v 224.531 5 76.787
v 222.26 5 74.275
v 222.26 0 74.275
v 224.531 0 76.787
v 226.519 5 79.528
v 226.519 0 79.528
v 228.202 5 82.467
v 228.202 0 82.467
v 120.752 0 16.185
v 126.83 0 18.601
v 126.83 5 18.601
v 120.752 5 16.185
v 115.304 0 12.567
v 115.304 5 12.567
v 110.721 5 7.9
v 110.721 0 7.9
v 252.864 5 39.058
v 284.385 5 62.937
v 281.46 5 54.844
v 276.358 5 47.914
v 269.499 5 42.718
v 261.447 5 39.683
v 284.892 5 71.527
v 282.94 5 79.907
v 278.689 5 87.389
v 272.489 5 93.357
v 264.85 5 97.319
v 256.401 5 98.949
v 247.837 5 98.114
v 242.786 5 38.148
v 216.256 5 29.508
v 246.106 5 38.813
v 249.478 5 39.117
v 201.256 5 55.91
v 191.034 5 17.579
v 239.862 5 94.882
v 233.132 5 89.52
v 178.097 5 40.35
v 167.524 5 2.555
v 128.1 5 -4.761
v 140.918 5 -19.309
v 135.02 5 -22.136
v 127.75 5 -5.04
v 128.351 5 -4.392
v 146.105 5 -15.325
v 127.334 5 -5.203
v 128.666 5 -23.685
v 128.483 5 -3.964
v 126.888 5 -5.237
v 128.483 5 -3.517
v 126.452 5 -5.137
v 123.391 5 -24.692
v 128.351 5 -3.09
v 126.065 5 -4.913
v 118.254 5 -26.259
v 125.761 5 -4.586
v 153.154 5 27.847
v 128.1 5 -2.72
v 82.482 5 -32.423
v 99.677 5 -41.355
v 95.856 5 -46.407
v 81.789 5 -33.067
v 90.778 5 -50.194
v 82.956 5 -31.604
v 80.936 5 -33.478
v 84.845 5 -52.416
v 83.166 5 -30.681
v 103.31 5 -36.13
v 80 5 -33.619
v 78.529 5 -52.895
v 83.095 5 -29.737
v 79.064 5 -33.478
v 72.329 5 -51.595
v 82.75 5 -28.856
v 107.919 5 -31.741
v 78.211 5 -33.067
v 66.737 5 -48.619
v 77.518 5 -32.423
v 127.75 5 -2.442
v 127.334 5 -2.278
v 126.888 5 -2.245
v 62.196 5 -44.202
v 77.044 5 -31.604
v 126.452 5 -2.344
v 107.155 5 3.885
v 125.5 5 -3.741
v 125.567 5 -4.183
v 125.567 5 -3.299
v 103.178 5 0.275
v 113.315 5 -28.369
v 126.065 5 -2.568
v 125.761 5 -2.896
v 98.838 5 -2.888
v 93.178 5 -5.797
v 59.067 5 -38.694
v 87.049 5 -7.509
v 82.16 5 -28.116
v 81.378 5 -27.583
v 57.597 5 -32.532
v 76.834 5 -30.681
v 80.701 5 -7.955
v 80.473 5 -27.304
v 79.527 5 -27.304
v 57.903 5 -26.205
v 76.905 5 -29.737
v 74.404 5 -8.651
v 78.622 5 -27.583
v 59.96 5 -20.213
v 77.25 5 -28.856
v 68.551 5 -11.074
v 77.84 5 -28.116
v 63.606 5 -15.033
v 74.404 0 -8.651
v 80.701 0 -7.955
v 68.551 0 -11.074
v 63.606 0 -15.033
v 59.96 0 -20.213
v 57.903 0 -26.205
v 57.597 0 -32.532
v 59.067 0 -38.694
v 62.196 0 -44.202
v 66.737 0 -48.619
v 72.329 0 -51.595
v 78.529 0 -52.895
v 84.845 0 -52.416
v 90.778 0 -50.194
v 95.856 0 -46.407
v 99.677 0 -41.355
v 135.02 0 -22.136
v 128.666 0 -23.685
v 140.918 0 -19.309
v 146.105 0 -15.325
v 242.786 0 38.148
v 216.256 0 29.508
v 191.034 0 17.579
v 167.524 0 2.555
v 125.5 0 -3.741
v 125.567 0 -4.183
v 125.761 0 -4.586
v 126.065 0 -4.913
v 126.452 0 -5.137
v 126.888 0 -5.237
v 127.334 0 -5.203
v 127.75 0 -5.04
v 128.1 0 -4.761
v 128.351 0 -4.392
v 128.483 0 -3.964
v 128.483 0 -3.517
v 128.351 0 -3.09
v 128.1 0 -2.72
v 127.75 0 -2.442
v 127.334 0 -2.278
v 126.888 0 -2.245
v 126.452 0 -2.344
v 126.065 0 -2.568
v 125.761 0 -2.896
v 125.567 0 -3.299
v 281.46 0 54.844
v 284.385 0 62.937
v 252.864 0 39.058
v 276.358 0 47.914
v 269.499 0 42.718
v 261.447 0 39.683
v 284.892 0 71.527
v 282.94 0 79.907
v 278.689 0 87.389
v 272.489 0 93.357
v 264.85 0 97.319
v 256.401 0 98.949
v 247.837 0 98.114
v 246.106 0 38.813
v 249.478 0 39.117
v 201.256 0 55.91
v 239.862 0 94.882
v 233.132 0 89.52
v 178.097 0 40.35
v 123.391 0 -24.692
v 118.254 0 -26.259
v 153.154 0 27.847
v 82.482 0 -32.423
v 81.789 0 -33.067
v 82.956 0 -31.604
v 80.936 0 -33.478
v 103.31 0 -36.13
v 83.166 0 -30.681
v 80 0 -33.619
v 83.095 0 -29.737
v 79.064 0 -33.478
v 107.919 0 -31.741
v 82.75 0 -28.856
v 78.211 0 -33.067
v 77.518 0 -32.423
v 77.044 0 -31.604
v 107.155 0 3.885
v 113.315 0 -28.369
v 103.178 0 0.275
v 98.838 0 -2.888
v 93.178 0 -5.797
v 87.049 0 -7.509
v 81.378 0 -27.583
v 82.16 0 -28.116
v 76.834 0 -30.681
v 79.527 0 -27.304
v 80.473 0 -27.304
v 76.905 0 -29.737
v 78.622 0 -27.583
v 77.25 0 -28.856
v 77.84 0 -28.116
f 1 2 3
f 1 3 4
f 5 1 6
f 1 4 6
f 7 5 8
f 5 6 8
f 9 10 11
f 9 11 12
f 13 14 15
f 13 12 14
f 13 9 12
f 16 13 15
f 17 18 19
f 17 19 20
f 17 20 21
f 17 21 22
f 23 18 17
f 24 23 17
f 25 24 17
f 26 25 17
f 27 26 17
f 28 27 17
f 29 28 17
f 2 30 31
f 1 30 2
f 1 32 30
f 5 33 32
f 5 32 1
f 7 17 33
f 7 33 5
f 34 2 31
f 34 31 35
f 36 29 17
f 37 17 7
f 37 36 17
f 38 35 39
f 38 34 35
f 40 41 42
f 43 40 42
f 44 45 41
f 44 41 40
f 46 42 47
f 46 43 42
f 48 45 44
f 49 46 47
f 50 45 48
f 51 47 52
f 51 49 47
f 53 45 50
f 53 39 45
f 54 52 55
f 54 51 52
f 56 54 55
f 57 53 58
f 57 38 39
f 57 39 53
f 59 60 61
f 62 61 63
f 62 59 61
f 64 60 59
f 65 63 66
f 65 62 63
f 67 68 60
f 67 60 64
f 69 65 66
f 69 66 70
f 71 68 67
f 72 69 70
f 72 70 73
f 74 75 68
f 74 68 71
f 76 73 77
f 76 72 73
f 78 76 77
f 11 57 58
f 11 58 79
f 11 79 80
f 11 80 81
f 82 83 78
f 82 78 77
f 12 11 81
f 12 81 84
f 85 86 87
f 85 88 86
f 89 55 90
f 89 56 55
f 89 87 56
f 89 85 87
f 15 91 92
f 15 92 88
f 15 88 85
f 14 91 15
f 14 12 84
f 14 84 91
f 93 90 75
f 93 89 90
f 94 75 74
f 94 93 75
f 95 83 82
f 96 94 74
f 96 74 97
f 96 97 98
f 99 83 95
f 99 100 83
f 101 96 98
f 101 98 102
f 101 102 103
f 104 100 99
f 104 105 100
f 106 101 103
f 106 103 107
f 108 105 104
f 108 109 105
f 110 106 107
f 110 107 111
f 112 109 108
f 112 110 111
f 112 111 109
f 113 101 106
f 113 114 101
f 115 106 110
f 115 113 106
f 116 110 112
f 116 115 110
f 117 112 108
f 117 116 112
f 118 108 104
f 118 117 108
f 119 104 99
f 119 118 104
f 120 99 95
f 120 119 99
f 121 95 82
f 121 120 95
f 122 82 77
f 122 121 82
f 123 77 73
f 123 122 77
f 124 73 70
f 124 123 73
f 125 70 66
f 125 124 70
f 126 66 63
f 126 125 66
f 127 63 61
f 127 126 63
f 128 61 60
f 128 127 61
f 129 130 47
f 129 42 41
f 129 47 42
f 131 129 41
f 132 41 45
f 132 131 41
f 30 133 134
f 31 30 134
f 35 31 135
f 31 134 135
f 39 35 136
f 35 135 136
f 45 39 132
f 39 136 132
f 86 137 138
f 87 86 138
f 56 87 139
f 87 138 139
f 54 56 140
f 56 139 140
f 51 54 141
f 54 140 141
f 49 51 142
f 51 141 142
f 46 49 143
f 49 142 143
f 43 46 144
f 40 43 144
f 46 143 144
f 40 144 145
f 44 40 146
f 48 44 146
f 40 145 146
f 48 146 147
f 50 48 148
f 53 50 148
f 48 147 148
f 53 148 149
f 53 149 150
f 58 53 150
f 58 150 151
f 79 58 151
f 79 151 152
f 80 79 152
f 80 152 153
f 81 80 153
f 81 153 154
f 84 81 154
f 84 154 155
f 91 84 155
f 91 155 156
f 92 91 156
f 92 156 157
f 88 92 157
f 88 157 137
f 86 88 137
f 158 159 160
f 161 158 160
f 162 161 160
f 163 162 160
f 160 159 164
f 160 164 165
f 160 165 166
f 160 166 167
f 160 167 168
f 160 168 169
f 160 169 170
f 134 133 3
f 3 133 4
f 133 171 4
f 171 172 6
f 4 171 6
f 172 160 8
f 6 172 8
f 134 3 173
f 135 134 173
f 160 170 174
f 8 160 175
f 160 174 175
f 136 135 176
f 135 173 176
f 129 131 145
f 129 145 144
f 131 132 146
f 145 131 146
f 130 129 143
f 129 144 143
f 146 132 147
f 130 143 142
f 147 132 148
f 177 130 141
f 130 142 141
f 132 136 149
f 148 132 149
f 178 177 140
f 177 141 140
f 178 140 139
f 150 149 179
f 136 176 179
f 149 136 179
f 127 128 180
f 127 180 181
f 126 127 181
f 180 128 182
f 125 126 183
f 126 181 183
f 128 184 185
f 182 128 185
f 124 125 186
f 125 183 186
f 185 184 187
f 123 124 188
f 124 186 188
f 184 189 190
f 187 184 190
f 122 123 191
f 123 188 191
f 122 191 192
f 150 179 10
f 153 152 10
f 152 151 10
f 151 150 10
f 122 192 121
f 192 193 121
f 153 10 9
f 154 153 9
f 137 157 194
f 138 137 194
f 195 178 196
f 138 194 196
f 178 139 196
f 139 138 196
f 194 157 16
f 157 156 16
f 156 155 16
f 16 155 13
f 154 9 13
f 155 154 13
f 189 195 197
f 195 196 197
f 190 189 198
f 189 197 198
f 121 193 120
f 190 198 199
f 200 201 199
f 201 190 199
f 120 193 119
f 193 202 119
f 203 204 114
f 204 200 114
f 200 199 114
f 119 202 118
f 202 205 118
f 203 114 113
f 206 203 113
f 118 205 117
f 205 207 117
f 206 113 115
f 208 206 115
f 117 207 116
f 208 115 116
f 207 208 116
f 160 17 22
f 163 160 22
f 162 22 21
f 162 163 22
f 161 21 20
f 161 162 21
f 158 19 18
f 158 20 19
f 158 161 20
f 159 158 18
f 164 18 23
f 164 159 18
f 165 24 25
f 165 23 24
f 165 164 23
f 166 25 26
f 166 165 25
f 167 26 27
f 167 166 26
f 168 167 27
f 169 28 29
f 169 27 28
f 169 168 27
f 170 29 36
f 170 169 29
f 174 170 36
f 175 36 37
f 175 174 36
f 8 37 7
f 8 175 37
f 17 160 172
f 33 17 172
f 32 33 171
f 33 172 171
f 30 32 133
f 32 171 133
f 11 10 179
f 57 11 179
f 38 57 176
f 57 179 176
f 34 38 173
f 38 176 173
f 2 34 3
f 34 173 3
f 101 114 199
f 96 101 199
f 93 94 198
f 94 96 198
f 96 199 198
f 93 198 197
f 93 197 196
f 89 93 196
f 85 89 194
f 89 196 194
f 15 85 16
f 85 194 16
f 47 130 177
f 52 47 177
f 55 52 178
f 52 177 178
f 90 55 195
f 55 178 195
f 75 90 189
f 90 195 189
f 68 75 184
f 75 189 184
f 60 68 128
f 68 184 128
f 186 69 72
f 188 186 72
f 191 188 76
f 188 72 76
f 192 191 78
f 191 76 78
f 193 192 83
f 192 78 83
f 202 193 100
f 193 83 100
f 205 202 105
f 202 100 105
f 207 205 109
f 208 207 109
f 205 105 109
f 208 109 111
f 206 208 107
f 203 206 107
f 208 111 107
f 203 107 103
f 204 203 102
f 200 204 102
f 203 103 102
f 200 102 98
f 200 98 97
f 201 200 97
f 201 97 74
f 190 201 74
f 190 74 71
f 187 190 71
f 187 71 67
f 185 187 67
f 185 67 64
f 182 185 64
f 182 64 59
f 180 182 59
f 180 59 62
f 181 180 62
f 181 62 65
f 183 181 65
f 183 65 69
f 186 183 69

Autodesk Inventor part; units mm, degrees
ref_plane "YZ Plane" through (0, 0, 0) normal (1, 0, 0) x (0, 1, 0)
ref_plane "XZ Plane" through (0, 0, 0) normal (0, 1, 0) x (-1, 0, 0)
ref_plane "XY Plane" through (0, 0, 0) normal (0, 0, 1) x (1, 0, 0)
sketch "Cara" plane through (0, 0, 0) normal (0, 0, 1) x (1, 0, 0)
  line L0 (-22.1935, -24.9393) -> (-15.1747, -17.9205)
  arc A0 (-12.474, -17.8034) -> (-15.1747, -17.9205) centre (-13.7605, -19.3347) ccw
  arc A1 (-12.474, -17.8034) -> (-6.107, -21.4794) centre (1.0981, -1.6477) ccw
  arc A2 (-4.8581, -23.8768) -> (-6.107, -21.4794) centre (-6.79, -23.3592) ccw
  line L1 (-4.8581, -23.8768) -> (-7.4272, -33.4646)
  arc A3 (-9.9928, -34.8439) -> (-7.4272, -33.4646) centre (-9.359, -32.947) ccw
  arc A4 (-22.1052, -27.8509) -> (-9.9928, -34.8439) centre (1.0981, -1.6477) ccw
  arc A5 (-22.1935, -24.9393) -> (-22.1052, -27.8509) centre (-20.7793, -26.3535) ccw
  line L2 (9.6235, -33.4646) -> (7.0544, -23.8768)
  arc A6 (8.3033, -21.4794) -> (7.0544, -23.8768) centre (8.9863, -23.3592) ccw
  arc A7 (8.3033, -21.4794) -> (14.6703, -17.8034) centre (1.0981, -1.6477) ccw
  arc A8 (17.371, -17.9205) -> (14.6703, -17.8034) centre (15.9568, -19.3347) ccw
  line L3 (17.371, -17.9205) -> (24.3898, -24.9393)
  arc A9 (24.3015, -27.8509) -> (24.3898, -24.9393) centre (22.9756, -26.3535) ccw
  arc A10 (12.1891, -34.8439) -> (24.3015, -27.8509) centre (1.0981, -1.6477) ccw
  arc A11 (9.6235, -33.4646) -> (12.1891, -34.8439) centre (11.5553, -32.947) ccw
  line L4 (32.9151, -10.173) -> (23.3272, -7.604)
  arc A12 (21.8755, -5.3237) -> (23.3272, -7.604) centre (23.8449, -5.6721) ccw
  arc A13 (21.8755, -5.3237) -> (21.8755, 2.0283) centre (1.0981, -1.6477) ccw
  arc A14 (23.3272, 4.3086) -> (21.8755, 2.0283) centre (23.8449, 2.3767) ccw
  line L5 (23.3272, 4.3086) -> (32.9151, 6.8776)
  arc A15 (35.3924, 5.3454) -> (32.9151, 6.8776) centre (33.4327, 4.9458) ccw
  arc A16 (35.3924, -8.6408) -> (35.3924, 5.3454) centre (1.0981, -1.6477) ccw
  arc A17 (32.9151, -10.173) -> (35.3924, -8.6408) centre (33.4327, -8.2412) ccw
  line L6 (24.3898, 21.6439) -> (17.371, 14.6251)
  arc A18 (14.6703, 14.508) -> (17.371, 14.6251) centre (15.9568, 16.0394) ccw
  arc A19 (14.6703, 14.508) -> (8.3033, 18.184) centre (1.0981, -1.6477) ccw
  arc A20 (7.0544, 20.5814) -> (8.3033, 18.184) centre (8.9863, 20.0638) ccw
  line L7 (7.0544, 20.5814) -> (9.6235, 30.1693)
  arc A21 (12.1891, 31.5486) -> (9.6235, 30.1693) centre (11.5553, 29.6516) ccw
  arc A22 (24.3015, 24.5555) -> (12.1891, 31.5486) centre (1.0981, -1.6477) ccw
  arc A23 (24.3898, 21.6439) -> (24.3015, 24.5555) centre (22.9756, 23.0582) ccw
  line L8 (-7.4272, 30.1693) -> (-4.8581, 20.5814)
  arc A24 (-6.107, 18.184) -> (-4.8581, 20.5814) centre (-6.79, 20.0638) ccw
  arc A25 (-6.107, 18.184) -> (-12.474, 14.508) centre (1.0981, -1.6477) ccw
  arc A26 (-15.1747, 14.6251) -> (-12.474, 14.508) centre (-13.7605, 16.0394) ccw
  line L9 (-15.1747, 14.6251) -> (-22.1935, 21.6439)
  arc A27 (-22.1052, 24.5555) -> (-22.1935, 21.6439) centre (-20.7793, 23.0582) ccw
  arc A28 (-9.9928, 31.5486) -> (-22.1052, 24.5555) centre (1.0981, -1.6477) ccw
  arc A29 (-7.4272, 30.1693) -> (-9.9928, 31.5486) centre (-9.359, 29.6516) ccw
  line L10 (-30.7188, 6.8776) -> (-21.131, 4.3086)
  arc A30 (-19.6792, 2.0283) -> (-21.131, 4.3086) centre (-21.6486, 2.3767) ccw
  arc A31 (-19.6792, 2.0283) -> (-19.6792, -5.3237) centre (1.0981, -1.6477) ccw
  arc A32 (-21.131, -7.604) -> (-19.6792, -5.3237) centre (-21.6486, -5.6721) ccw
  line L11 (-21.131, -7.604) -> (-30.7188, -10.173)
  arc A33 (-33.1961, -8.6408) -> (-30.7188, -10.173) centre (-31.2365, -8.2412) ccw
  arc A34 (-33.1961, 5.3454) -> (-33.1961, -8.6408) centre (1.0981, -1.6477) ccw
  arc A35 (-30.7188, 6.8776) -> (-33.1961, 5.3454) centre (-31.2365, 4.9458) ccw
  circle A36 centre (-37.4568, -19.3542) radius 1.5875
  circle A37 centre (39.653, 16.0588) radius 1.5875
  circle A38 centre (-16.6083, 36.9072) radius 1.5875
  circle A39 centre (18.8046, -40.2026) radius 1.5875
  circle A40 centre (1.0981, -1.6477) radius 15.5
  arc A41 (13.186, 39.6183) -> (16.9444, 39.4394) centre (15.4349, 47.2957) ccw
  arc A42 (13.186, 39.6183) -> (-10.9897, 39.6183) centre (1.0981, -1.6477) ccw
  arc A43 (-15.0916, 39.5133) -> (-10.9897, 39.6183) centre (-13.2386, 47.2957) ccw
  arc A44 (-15.0916, 39.5133) -> (-19.5734, 37.455) centre (-16.0181, 35.6221) ccw
  arc A45 (-22.3261, 34.412) -> (-19.5734, 37.455) centre (-26.6841, 41.1208) ccw
  arc A46 (-22.3261, 34.412) -> (-34.8255, 21.9848) centre (1.0981, -1.6477) ccw
  arc A47 (-37.5746, 19.4158) -> (-34.8255, 21.9848) centre (-41.5089, 26.3816) ccw
  arc A48 (-39.989, 14.1986) -> (-37.5746, 19.4158) centre (-37.4054, 16.1703) ccw
  arc A49 (-40.1679, 10.4402) -> (-39.989, 14.1986) centre (-47.8453, 12.6891) ccw
  arc A50 (-40.1679, 10.4402) -> (-40.2027, -13.6161) centre (1.0981, -1.6477) ccw
  arc A51 (-40.1338, -17.8165) -> (-40.2027, -13.6161) centre (-47.8865, -15.8428) ccw
  arc A52 (-40.1338, -17.8165) -> (-38.0349, -22.3868) centre (-36.2575, -18.8034) ccw
  arc A53 (-34.8937, -25.1762) -> (-38.0349, -22.3868) centre (-41.5898, -29.5536) ccw
  arc A54 (-34.8937, -25.1762) -> (-22.5344, -37.5713) centre (1.0981, -1.6477) ccw
  arc A55 (-19.9654, -40.3204) -> (-22.5344, -37.5713) centre (-26.9311, -44.2547) ccw
  arc A56 (-14.7481, -42.7348) -> (-19.9654, -40.3204) centre (-16.7198, -40.1512) ccw
  arc A57 (-10.9897, -42.9137) -> (-14.7481, -42.7348) centre (-13.2386, -50.5911) ccw
  arc A58 (-10.9897, -42.9137) -> (13.0666, -42.9485) centre (1.0981, -1.6477) ccw
  arc A59 (17.2235, -42.8687) -> (13.0666, -42.9485) centre (15.2932, -50.6324) ccw
  arc A60 (17.2235, -42.8687) -> (21.7574, -40.7935) centre (18.1887, -38.9869) ccw
  arc A61 (24.5347, -37.6994) -> (21.7574, -40.7935) centre (28.895, -44.4067) ccw
  arc A62 (24.5347, -37.6994) -> (37.0217, -25.2802) centre (1.0981, -1.6477) ccw
  arc A63 (39.7709, -22.7112) -> (37.0217, -25.2802) centre (43.7052, -29.6769) ccw
  arc A64 (42.1093, -17.3982) -> (39.7709, -22.7112) centre (39.6017, -19.4656) ccw
  arc A65 (42.3332, -13.8408) -> (42.1093, -17.3982) centre (50.0048, -16.1093) ccw
  arc A66 (42.3332, -13.8408) -> (42.3989, 10.3207) centre (1.0981, -1.6477) ccw
  arc A67 (42.3301, 14.5211) -> (42.3989, 10.3207) centre (50.0828, 12.5474) ccw
  arc A68 (42.3301, 14.5211) -> (40.2312, 19.0914) centre (38.4538, 15.508) ccw
  arc A69 (37.09, 21.8808) -> (40.2312, 19.0914) centre (43.7861, 26.2582) ccw
  arc A70 (37.09, 21.8808) -> (24.7307, 34.2759) centre (1.0981, -1.6477) ccw
  arc A71 (22.1617, 37.0251) -> (24.7307, 34.2759) centre (29.1274, 40.9594) ccw
  arc A72 (16.9444, 39.4394) -> (22.1617, 37.0251) centre (18.9161, 36.8558) ccw
  arc A73 (-38.8583, 20.9988) -> (-42.0265, 14.1525) centre (-36.2077, 15.616) ccw
  spline S0 degree 3 poles (-40.2504, 14.5992) (-40.3671, 14.8104) (-40.4601, 15.0344) (-40.6458, 15.6766) (-40.6826, 16.1053) (-40.5958, 16.8869) (-40.4968, 17.2357) (-40.1864, 17.8912) (-39.9757, 18.1925) (-39.4148, 18.7612) (-39.0515, 19.0059) (-38.4565, 19.2528) (-38.255, 19.3143) (-38.0493, 19.3558) knots 0 0 0 0 0.118944 0.118944 0.328096 0.328096 0.504735 0.504735 0.683825 0.683825 0.89662 0.89662 1 1 1 1
  line L12 (-38.8583, 20.9988) -> (-38.0493, 19.3558)
  arc A74 (-38.8583, 20.9988) -> (-42.0265, 14.1525) centre (-36.2077, 15.616) ccw
  line L13 (-40.2504, 14.5992) -> (-42.0265, 14.1525)
  line L14 (-38.5582, 21.1573) -> (-37.5746, 19.4158)
  arc A75 (-37.5746, 19.4158) -> (-34.8255, 21.9848) centre (-41.5089, 26.3816) ccw
  line L15 (-36.4963, 23.084) -> (-34.8255, 21.9848)
  arc A76 (-38.5582, 21.1573) -> (-36.4963, 23.084) centre (-41.5089, 26.3816) ccw
  spline S1 degree 3 poles (-38.0493, 19.3558) (-37.9271, 19.3805) (-37.8093, 19.397) (-37.6564, 19.4108) (-37.6155, 19.4137) (-37.5746, 19.4158) knots 0 0 0 0 0.731153 0.731153 1 1 1 1
  line L16 (-38.5582, 21.1573) -> (-37.5746, 19.4158)
  arc A77 (-38.8583, 20.9988) -> (-38.5582, 21.1573) centre (-41.5089, 26.3816) ccw
  line L17 (-38.8583, 20.9988) -> (-38.0493, 19.3558)
  spline S2 degree 3 poles (-39.989, 14.1986) (-40.081, 14.3191) (-40.1695, 14.4526) (-40.2504, 14.5992) knots 0 0 0 0 1 1 1 1
  line L18 (-40.2504, 14.5992) -> (-42.0265, 14.1525)
  arc A78 (-41.953, 13.8212) -> (-42.0265, 14.1525) centre (-47.8453, 12.6891) ccw
  line L19 (-39.989, 14.1986) -> (-41.953, 13.8212)
  line L20 (-39.989, 14.1986) -> (-41.953, 13.8212)
  arc A79 (-42.0872, 11.0024) -> (-41.953, 13.8212) centre (-47.8453, 12.6891) ccw
  line L21 (-42.0872, 11.0024) -> (-40.1679, 10.4402)
  arc A80 (-40.1679, 10.4402) -> (-39.989, 14.1986) centre (-47.8453, 12.6891) ccw
  arc A81 (-42.0872, 11.0024) -> (-42.1236, -14.1728) centre (1.0981, -1.6477) ccw
  line L22 (-36.4963, 23.084) -> (-34.8255, 21.9848)
  arc A82 (-22.3261, 34.412) -> (-34.8255, 21.9848) centre (1.0981, -1.6477) ccw
  line L23 (-23.4156, 36.0892) -> (-22.3261, 34.412)
  arc A83 (-23.4156, 36.0892) -> (-36.4963, 23.084) centre (1.0981, -1.6477) ccw
  line L24 (-23.4156, 36.0892) -> (-22.3261, 34.412)
  arc A84 (-22.3261, 34.412) -> (-19.5734, 37.455) centre (-26.6841, 41.1208) ccw
  line L25 (-21.3511, 38.3714) -> (-19.5734, 37.455)
  arc A85 (-23.4156, 36.0892) -> (-21.3511, 38.3714) centre (-26.6841, 41.1208) ccw
  line L26 (-21.3511, 38.3714) -> (-19.5734, 37.455)
  arc A86 (-15.0916, 39.5133) -> (-19.5734, 37.455) centre (-16.0181, 35.6221) ccw
  line L27 (-14.6284, 41.4589) -> (-15.0916, 39.5133)
  arc A87 (-14.6284, 41.4589) -> (-21.3511, 38.3714) centre (-16.0181, 35.6221) ccw
  line L28 (-14.6284, 41.4589) -> (-15.0916, 39.5133)
  arc A88 (-15.0916, 39.5133) -> (-10.9897, 39.6183) centre (-13.2386, 47.2957) ccw
  line L29 (-11.5519, 41.5377) -> (-10.9897, 39.6183)
  arc A89 (-14.6284, 41.4589) -> (-11.5519, 41.5377) centre (-13.2386, 47.2957) ccw
  line L30 (-11.5519, 41.5377) -> (-10.9897, 39.6183)
  arc A90 (13.186, 39.6183) -> (-10.9897, 39.6183) centre (1.0981, -1.6477) ccw
  line L31 (13.7482, 41.5377) -> (13.186, 39.6183)
  arc A91 (13.7482, 41.5377) -> (-11.5519, 41.5377) centre (1.0981, -1.6477) ccw
  line L32 (16.9444, 39.4394) -> (16.567, 41.4035)
  arc A92 (13.7482, 41.5377) -> (16.567, 41.4035) centre (15.4349, 47.2957) ccw
  line L33 (13.7482, 41.5377) -> (13.186, 39.6183)
  arc A93 (13.186, 39.6183) -> (16.9444, 39.4394) centre (15.4349, 47.2957) ccw
  spline S3 degree 3 poles (16.9444, 39.4394) (17.0649, 39.5314) (17.1985, 39.6199) (17.3451, 39.7009) knots 0 0 0 0 1 1 1 1
  line L34 (17.3451, 39.7009) -> (16.8984, 41.4769)
  arc A94 (16.567, 41.4035) -> (16.8984, 41.4769) centre (15.4349, 47.2957) ccw
  line L35 (16.9444, 39.4394) -> (16.567, 41.4035)
  spline S4 degree 3 poles (17.3451, 39.7009) (17.5563, 39.8175) (17.7803, 39.9105) (18.4224, 40.0962) (18.8512, 40.133) (19.6327, 40.0462) (19.9815, 39.9473) (20.6371, 39.6368) (20.9383, 39.4261) (21.507, 38.8652) (21.7517, 38.502) (21.9986, 37.907) (22.0601, 37.7054) (22.1017, 37.4997) knots 0 0 0 0 0.118944 0.118944 0.328096 0.328096 0.504735 0.504735 0.683825 0.683825 0.89662 0.89662 1 1 1 1
  line L36 (23.7446, 38.3088) -> (22.1017, 37.4997)
  arc A95 (23.7446, 38.3088) -> (16.8984, 41.4769) centre (18.3618, 35.6581) ccw
  line L37 (17.3451, 39.7009) -> (16.8984, 41.4769)
  line L38 (37.09, 21.8808) -> (38.764, 22.9751)
  arc A96 (38.764, 22.9751) -> (25.8298, 35.9468) centre (1.0981, -1.6477) ccw
  line L39 (25.8298, 35.9468) -> (24.7307, 34.2759)
  arc A97 (37.09, 21.8808) -> (24.7307, 34.2759) centre (1.0981, -1.6477) ccw
  line L40 (23.9031, 38.0086) -> (22.1617, 37.0251)
  arc A98 (22.1617, 37.0251) -> (24.7307, 34.2759) centre (29.1274, 40.9594) ccw
  line L41 (25.8298, 35.9468) -> (24.7307, 34.2759)
  arc A99 (23.9031, 38.0086) -> (25.8298, 35.9468) centre (29.1274, 40.9594) ccw
  spline S5 degree 3 poles (22.1017, 37.4997) (22.1264, 37.3775) (22.1428, 37.2598) (22.1566, 37.1069) (22.1595, 37.0659) (22.1617, 37.0251) knots 0 0 0 0 0.731153 0.731153 1 1 1 1
  line L42 (23.9031, 38.0086) -> (22.1617, 37.0251)
  arc A100 (23.7446, 38.3088) -> (23.9031, 38.0086) centre (29.1274, 40.9594) ccw
  line L43 (23.7446, 38.3088) -> (22.1017, 37.4997)
  line L44 (37.09, 21.8808) -> (38.764, 22.9751)
  arc A101 (37.09, 21.8808) -> (40.2312, 19.0914) centre (43.7861, 26.2582) ccw
  line L45 (41.1199, 20.8831) -> (40.2312, 19.0914)
  arc A102 (38.764, 22.9751) -> (41.1199, 20.8831) centre (43.7861, 26.2582) ccw
  line L46 (41.1199, 20.8831) -> (40.2312, 19.0914)
  arc A103 (42.3301, 14.5211) -> (40.2312, 19.0914) centre (38.4538, 15.508) ccw
  line L47 (44.2683, 14.0277) -> (42.3301, 14.5211)
  arc A104 (44.2683, 14.0277) -> (41.1199, 20.8831) centre (38.4538, 15.508) ccw
  line L48 (44.2683, 14.0277) -> (42.3301, 14.5211)
  arc A105 (42.3301, 14.5211) -> (42.3989, 10.3207) centre (50.0828, 12.5474) ccw
  line L49 (44.3199, 10.8774) -> (42.3989, 10.3207)
  arc A106 (44.2683, 14.0277) -> (44.3199, 10.8774) centre (50.0828, 12.5474) ccw
  line L50 (44.3199, 10.8774) -> (42.3989, 10.3207)
  arc A107 (42.3332, -13.8408) -> (42.3989, 10.3207) centre (1.0981, -1.6477) ccw
  line L51 (44.2511, -14.4079) -> (42.3332, -13.8408)
  arc A108 (44.2511, -14.4079) -> (44.3199, 10.8774) centre (1.0981, -1.6477) ccw
  spline S6 degree 3 poles (42.4708, -17.939) (42.66, -18.2947) (42.7816, -18.6826) (42.8764, -19.4825) (42.8492, -19.8873) (42.6667, -20.5952) (42.5369, -20.899) (42.1389, -21.5409) (41.845, -21.8556) (41.1886, -22.3275) (40.8415, -22.494) (40.3834, -22.6216) (40.2925, -22.6427) (40.2009, -22.6599) knots 0 0 0 0 0.198107 0.198107 0.395669 0.395669 0.556952 0.556952 0.766408 0.766408 0.954091 0.954091 1 1 1 1
  line L52 (41.0245, -24.3091) -> (40.2009, -22.6599)
  arc A109 (41.0245, -24.3091) -> (44.1743, -17.5253) centre (38.3438, -18.9413) ccw
  line L53 (42.4708, -17.939) -> (44.1743, -17.5253)
  line L54 (42.1093, -17.3982) -> (44.0832, -17.076)
  arc A110 (44.2511, -14.4079) -> (44.0832, -17.076) centre (50.0048, -16.1093) ccw
  line L55 (44.2511, -14.4079) -> (42.3332, -13.8408)
  arc A111 (42.3332, -13.8408) -> (42.1093, -17.3982) centre (50.0048, -16.1093) ccw
  spline S7 degree 3 poles (42.1093, -17.3982) (42.1251, -17.4173) (42.1406, -17.4367) (42.2692, -17.6002) (42.376, -17.7609) (42.4708, -17.939) knots 0 0 0 0 0.119683 0.119683 1 1 1 1
  line L56 (42.4708, -17.939) -> (44.1743, -17.5253)
  arc A112 (44.0832, -17.076) -> (44.1743, -17.5253) centre (50.0048, -16.1093) ccw
  line L57 (42.1093, -17.3982) -> (44.0832, -17.076)
  spline S8 degree 3 poles (40.2009, -22.6599) (40.0946, -22.6799) (39.9919, -22.6936) (39.8527, -22.7062) (39.8117, -22.7091) (39.7709, -22.7112) knots 0 0 0 0 0.704713 0.704713 1 1 1 1
  line L58 (40.7545, -24.4527) -> (39.7709, -22.7112)
  arc A113 (41.0245, -24.3091) -> (40.7545, -24.4527) centre (43.7052, -29.6769) ccw
  line L59 (41.0245, -24.3091) -> (40.2009, -22.6599)
  line L60 (40.7545, -24.4527) -> (39.7709, -22.7112)
  arc A114 (39.7709, -22.7112) -> (37.0217, -25.2802) centre (43.7052, -29.6769) ccw
  line L61 (38.6926, -26.3794) -> (37.0217, -25.2802)
  arc A115 (40.7545, -24.4527) -> (38.6926, -26.3794) centre (43.7052, -29.6769) ccw
  line L62 (38.6926, -26.3794) -> (37.0217, -25.2802)
  arc A116 (24.5347, -37.6994) -> (37.0217, -25.2802) centre (1.0981, -1.6477) ccw
  line L63 (25.6248, -39.3763) -> (24.5347, -37.6994)
  arc A117 (25.6248, -39.3763) -> (38.6926, -26.3794) centre (1.0981, -1.6477) ccw
  line L64 (25.6248, -39.3763) -> (24.5347, -37.6994)
  arc A118 (24.5347, -37.6994) -> (21.7574, -40.7935) centre (28.895, -44.4067) ccw
  line L65 (23.5418, -41.6968) -> (21.7574, -40.7935)
  arc A119 (25.6248, -39.3763) -> (23.5418, -41.6968) centre (28.895, -44.4067) ccw
  line L66 (23.5418, -41.6968) -> (21.7574, -40.7935)
  arc A120 (17.2235, -42.8687) -> (21.7574, -40.7935) centre (18.1887, -38.9869) ccw
  line L67 (16.7409, -44.8096) -> (17.2235, -42.8687)
  arc A121 (16.7409, -44.8096) -> (23.5418, -41.6968) centre (18.1887, -38.9869) ccw
  line L68 (16.7409, -44.8096) -> (17.2235, -42.8687)
  arc A122 (17.2235, -42.8687) -> (13.0666, -42.9485) centre (15.2932, -50.6324) ccw
  line L69 (13.6232, -44.8695) -> (13.0666, -42.9485)
  arc A123 (16.7409, -44.8096) -> (13.6232, -44.8695) centre (15.2932, -50.6324) ccw
  arc A124 (-10.9897, -42.9137) -> (13.0666, -42.9485) centre (1.0981, -1.6477) ccw
  line L70 (13.6232, -44.8695) -> (13.0666, -42.9485)
  arc A125 (-10.9897, -42.9137) -> (13.0666, -42.9485) centre (1.0981, -1.6477) ccw
  line L71 (-11.5519, -44.8331) -> (-10.9897, -42.9137)
  arc A126 (-11.5519, -44.8331) -> (13.6232, -44.8695) centre (1.0981, -1.6477) ccw
  line L72 (-14.7481, -42.7348) -> (-14.3707, -44.6989)
  arc A127 (-11.5519, -44.8331) -> (-14.3707, -44.6989) centre (-13.2386, -50.5911) ccw
  line L73 (-11.5519, -44.8331) -> (-10.9897, -42.9137)
  arc A128 (-10.9897, -42.9137) -> (-14.7481, -42.7348) centre (-13.2386, -50.5911) ccw
  spline S9 degree 3 poles (-15.1488, -42.9963) (-15.36, -43.1129) (-15.584, -43.2059) (-16.2261, -43.3916) (-16.6549, -43.4284) (-17.4365, -43.3416) (-17.7852, -43.2427) (-18.4408, -42.9322) (-18.742, -42.7215) (-19.3107, -42.1606) (-19.5554, -41.7973) (-19.8023, -41.2024) (-19.8638, -41.0008) (-19.9054, -40.7951) knots 0 0 0 0 0.118944 0.118944 0.328096 0.328096 0.504735 0.504735 0.683825 0.683825 0.89662 0.89662 1 1 1 1
  line L74 (-21.5483, -41.6041) -> (-19.9054, -40.7951)
  arc A129 (-21.5483, -41.6041) -> (-14.7021, -44.7723) centre (-16.1656, -38.9535) ccw
  line L75 (-15.1488, -42.9963) -> (-14.7021, -44.7723)
  spline S10 degree 3 poles (-14.7481, -42.7348) (-14.8686, -42.8268) (-15.0022, -42.9153) (-15.1488, -42.9963) knots 0 0 0 0 1 1 1 1
  line L76 (-15.1488, -42.9963) -> (-14.7021, -44.7723)
  arc A130 (-14.3707, -44.6989) -> (-14.7021, -44.7723) centre (-13.2386, -50.5911) ccw
  line L77 (-14.7481, -42.7348) -> (-14.3707, -44.6989)
  spline S11 degree 3 poles (-19.9054, -40.7951) (-19.9301, -40.6729) (-19.9466, -40.5552) (-19.9604, -40.4023) (-19.9633, -40.3613) (-19.9654, -40.3204) knots 0 0 0 0 0.731153 0.731153 1 1 1 1
  line L78 (-21.7068, -41.304) -> (-19.9654, -40.3204)
  arc A131 (-21.5483, -41.6041) -> (-21.7068, -41.304) centre (-26.9311, -44.2547) ccw
  line L79 (-21.5483, -41.6041) -> (-19.9054, -40.7951)
  circle A132 centre (-16.7198, -40.1512) radius 3.25
  circle A133 centre (-16.7198, -40.1512) radius 1.5875
  circle A134 centre (39.6017, -19.4656) radius 3.25
  circle A135 centre (39.6017, -19.4656) radius 1.5875
  circle A136 centre (18.9161, 36.8558) radius 3.25
  circle A137 centre (18.9161, 36.8558) radius 1.5875
  circle A138 centre (-37.4054, 16.1703) radius 3.25
  circle A139 centre (-37.4054, 16.1703) radius 1.5875
  line L80 (-42.072, -17.3231) -> (-40.1338, -17.8165)
  arc A140 (-40.1338, -17.8165) -> (-40.2027, -13.6161) centre (-47.8865, -15.8428) ccw
  line L81 (-42.1236, -14.1728) -> (-40.2027, -13.6161)
  arc A141 (-42.072, -17.3231) -> (-42.1236, -14.1728) centre (-47.8865, -15.8428) ccw
  line L82 (-38.9237, -24.1785) -> (-38.0349, -22.3868)
  arc A142 (-40.1338, -17.8165) -> (-38.0349, -22.3868) centre (-36.2575, -18.8034) ccw
  line L83 (-42.072, -17.3231) -> (-40.1338, -17.8165)
  arc A143 (-42.072, -17.3231) -> (-38.9237, -24.1785) centre (-36.2575, -18.8034) ccw
  line L84 (-36.5677, -26.2705) -> (-34.8937, -25.1762)
  arc A144 (-34.8937, -25.1762) -> (-38.0349, -22.3868) centre (-41.5898, -29.5536) ccw
  line L85 (-38.9237, -24.1785) -> (-38.0349, -22.3868)
  arc A145 (-36.5677, -26.2705) -> (-38.9237, -24.1785) centre (-41.5898, -29.5536) ccw
  line L86 (-23.6336, -39.2421) -> (-22.5344, -37.5713)
  arc A146 (-34.8937, -25.1762) -> (-22.5344, -37.5713) centre (1.0981, -1.6477) ccw
  line L87 (-36.5677, -26.2705) -> (-34.8937, -25.1762)
  arc A147 (-36.5677, -26.2705) -> (-23.6336, -39.2421) centre (1.0981, -1.6477) ccw
  line L88 (-21.7068, -41.304) -> (-19.9654, -40.3204)
  arc A148 (-19.9654, -40.3204) -> (-22.5344, -37.5713) centre (-26.9311, -44.2547) ccw
  line L89 (-23.6336, -39.2421) -> (-22.5344, -37.5713)
  arc A149 (-21.7068, -41.304) -> (-23.6336, -39.2421) centre (-26.9311, -44.2547) ccw
  point P0 (1.3022, -1.7009)
  dimension "d1" = 30
  dimension "d2" = 40
  dimension "d3" = 70
  dimension "d4" = 90
  dimension "d5" = 65
  dimension "d6" = 95
  dimension "d7" = 100
  dimension "d8" = 72
  dimension "d9" = 17
  dimension "d10" = 110
  dimension "d11" = 4
sketch "Sketch1" plane through (0, 0, 0) normal (0, 1, 0) x (-1, 0, 0)
  line L0 (124.1031, 264.7872) -> (124.1031, -182.5054) construction
  line L1 (124.1031, -182.5054) -> (-344.0995, -182.5054) construction
  line L2 (-344.0995, -182.5054) -> (-344.0995, 264.7872) construction
  line L3 (-344.0995, 264.7872) -> (124.1031, 264.7872) construction
  circle A0 centre (0, 0) radius 50
  circle A1 centre (0, 0) radius 17.5
  line L4 (0, 0) -> (-80, -30.4436)
  line L5 (0, 0) -> (0, -17.5)
  line L6 (0, 0) -> (-17.5, 0)
  circle A2 centre (-80, -30.4436) radius 10
  line L7 (0, 0) -> (12.3744, -12.3744)
  line L8 (-80, -30.4436) -> (-80, -40.4436)
  line L9 (-80, -30.4436) -> (-72.9289, -37.5146)
  arc A3 (-80, -40.4436) -> (12.3744, -12.3744) centre (-63.3574, 70.821) ccw
  line L10 (-80, -30.4436) -> (-80, -20.4436)
  line L11 (0, 0) -> (-12.3744, 12.3744)
  arc A4 (-80, -20.4436) -> (-12.3744, 12.3744) centre (-83.4964, 72.8458) ccw
  circle A5 centre (0, 0) radius 7.6
  circle A6 centre (7.5887, 0.4145) radius 1.5
  circle A7 centre (-0.4145, 7.5887) radius 1.5
  circle A8 centre (-7.5887, -0.4145) radius 1.5
  circle A9 centre (0.4145, -7.5887) radius 1.5
  line L12 (-80, -30.4436) -> (-255, 68.982)
  circle A10 centre (-127, -3.7407) radius 10
  arc A11 (-86.3218, 30.5363) -> (-118.3053, -8.6806) centre (-58.582, -24.7376) ccw
  line L13 (-118.3053, -8.6806) -> (-135.6947, -8.6806)
  arc A12 (-119.9959, 36.9754) -> (-135.6947, -8.6806) centre (-99.2388, 4.3111) ccw
  line L14 (0, 0) -> (0, 50)
  line L15 (0, 0) -> (-40.4145, 70)
  circle A13 centre (-40.4145, 70) radius 2
  circle A14 centre (-40.4145, 70) radius 15
  line L16 (-32.9145, 57.0096) -> (-86.3218, 30.5363)
  line L17 (-119.9959, 36.9754) -> (-48.488, 82.642)
  circle A15 centre (-127, -3.7407) radius 1.5
  circle A16 centre (-80, -30.4436) radius 22.5
  circle A17 centre (-127, -3.7407) radius 20
  circle A18 centre (-255, 68.982) radius 30
  line L18 (-80, -30.4436) -> (-91.1147, -50.0066)
  arc A19 (-80, -30.4436) -> (-78.0459, -25.9962) centre (-100.6021, -18.7386) ccw
  line L19 (-80, -30.4436) -> (-68.8853, -10.8805)
  line L20 (-68.8853, -10.8805) -> (-226.6323, 78.7428)
  line L21 (-91.1147, -50.0066) -> (-248.8617, 39.6167)
  line L22 (-127, -3.7407) -> (-115.8853, 15.8224)
  arc A20 (-115.8853, 15.8224) -> (-68.8853, -10.8805) centre (-71.6057, 39.0455) ccw
  arc A21 (-226.6323, 78.7428) -> (-115.8853, 15.8224) centre (-67.2352, 230.3758) ccw
  line L23 (-127, -3.7407) -> (-138.1147, -23.3038)
  arc A22 (-91.1147, -50.0066) -> (-138.1147, -23.3038) centre (-135.3943, -73.2297) ccw
  arc A23 (-138.1147, -23.3038) -> (-248.8617, 39.6167) centre (-297.5118, -174.9367) ccw
  arc A24 (-226.6323, 78.7428) -> (-115.8853, 15.8224) centre (-67.2352, 230.3758) ccw
  point P0 (0, 25)
  point P1 (-86.1365, -8.7965)
  point P2 (-101.7366, -36.2546)
  point P3 (-136.9885, -4.2197)
  point P4 (-117.0311, -4.5286)
  dimension "d44" = 100
  dimension "d68" = 15.2
  dimension "d55" = 35
  dimension "d56" = 80
  dimension "d65" = 20
  dimension "d66" = 45
  dimension "d67" = 45
  dimension "d69" = 3
  dimension "d72" = 360
  dimension "d91" = 20
  dimension "d92" = 47
  dimension "d103" = 30
  dimension "d107" = 70
  dimension "d108" = 40
  dimension "d109" = 4
  dimension "d110" = 30
  dimension "d114" = 3
  dimension "d124" = 45
  dimension "d125" = 40
  dimension "d126" = 60
  dimension "d127" = 90
  dimension "d128" = 90
  dimension "d129" = 175
  dimension "d130" = 50
  dimension "d131" = 220
  dimension "d132" = 90
  dimension "d133" = 50
  dimension "d134" = 220
extrude "Extrusion4" add sketch "Sketch1" along normal blind 5 contours A16 L18 A2 A3 | A3 A2 L4 A16 | L4 A2 L19 A4 A16 | L8 L9 A2 | A2 L18 L8 | A22 A16 L12 A2 L18 | A16 A22 | A4 L19 A16 | A2 L9 L4 | L4 L19 A2 | A2 L12 L18 | L12 A2 L10 | L10 A2 L19 | A22 A17 L12 A16 | A23 A18 L12 A17 L23 | L23 A17 A22 | L19 A2 A4 | A4 A2 L12 A16 A20 L19 | A20 A16 | L12 A17 A20 A16 | A22 A17 L23 A10 L12 | A18 | A17 L12 A12 A10 L23 | L12 A10 A11 A17 | A21 A12 A17 L12 A18 | A17 A12 L12 | L23 L13 A10 | A10 L13 L23 | A11 A10 L22 A17 A20 | A20 A17 L22 | L22 A17 A12 A21 | L13 L23 A15 L12 | A11 A10 | L12 A15 L22 A10 A11 | A12 A17 L22 A10 L12 | L12 A10 A12 | A12 A10 L12 A15 L23 L13 | A10 A12 | A10 L22 A15 L12
hole "Hole2" at (80, 0, -30.4436) direction (0, 1, 0) diameter 6.35 end through all
fillet "Fillet1" radius 31.5 6 edges at (115.8853, 2.5, 15.8224) (86.1365, 2.5, -8.7965) (138.1147, 2.5, -23.3038) (101.7366, 2.5, -36.2546) (226.6323, 2.5, 78.7428) (248.8617, 2.5, 39.6167)
properties part number "Link3V1"
